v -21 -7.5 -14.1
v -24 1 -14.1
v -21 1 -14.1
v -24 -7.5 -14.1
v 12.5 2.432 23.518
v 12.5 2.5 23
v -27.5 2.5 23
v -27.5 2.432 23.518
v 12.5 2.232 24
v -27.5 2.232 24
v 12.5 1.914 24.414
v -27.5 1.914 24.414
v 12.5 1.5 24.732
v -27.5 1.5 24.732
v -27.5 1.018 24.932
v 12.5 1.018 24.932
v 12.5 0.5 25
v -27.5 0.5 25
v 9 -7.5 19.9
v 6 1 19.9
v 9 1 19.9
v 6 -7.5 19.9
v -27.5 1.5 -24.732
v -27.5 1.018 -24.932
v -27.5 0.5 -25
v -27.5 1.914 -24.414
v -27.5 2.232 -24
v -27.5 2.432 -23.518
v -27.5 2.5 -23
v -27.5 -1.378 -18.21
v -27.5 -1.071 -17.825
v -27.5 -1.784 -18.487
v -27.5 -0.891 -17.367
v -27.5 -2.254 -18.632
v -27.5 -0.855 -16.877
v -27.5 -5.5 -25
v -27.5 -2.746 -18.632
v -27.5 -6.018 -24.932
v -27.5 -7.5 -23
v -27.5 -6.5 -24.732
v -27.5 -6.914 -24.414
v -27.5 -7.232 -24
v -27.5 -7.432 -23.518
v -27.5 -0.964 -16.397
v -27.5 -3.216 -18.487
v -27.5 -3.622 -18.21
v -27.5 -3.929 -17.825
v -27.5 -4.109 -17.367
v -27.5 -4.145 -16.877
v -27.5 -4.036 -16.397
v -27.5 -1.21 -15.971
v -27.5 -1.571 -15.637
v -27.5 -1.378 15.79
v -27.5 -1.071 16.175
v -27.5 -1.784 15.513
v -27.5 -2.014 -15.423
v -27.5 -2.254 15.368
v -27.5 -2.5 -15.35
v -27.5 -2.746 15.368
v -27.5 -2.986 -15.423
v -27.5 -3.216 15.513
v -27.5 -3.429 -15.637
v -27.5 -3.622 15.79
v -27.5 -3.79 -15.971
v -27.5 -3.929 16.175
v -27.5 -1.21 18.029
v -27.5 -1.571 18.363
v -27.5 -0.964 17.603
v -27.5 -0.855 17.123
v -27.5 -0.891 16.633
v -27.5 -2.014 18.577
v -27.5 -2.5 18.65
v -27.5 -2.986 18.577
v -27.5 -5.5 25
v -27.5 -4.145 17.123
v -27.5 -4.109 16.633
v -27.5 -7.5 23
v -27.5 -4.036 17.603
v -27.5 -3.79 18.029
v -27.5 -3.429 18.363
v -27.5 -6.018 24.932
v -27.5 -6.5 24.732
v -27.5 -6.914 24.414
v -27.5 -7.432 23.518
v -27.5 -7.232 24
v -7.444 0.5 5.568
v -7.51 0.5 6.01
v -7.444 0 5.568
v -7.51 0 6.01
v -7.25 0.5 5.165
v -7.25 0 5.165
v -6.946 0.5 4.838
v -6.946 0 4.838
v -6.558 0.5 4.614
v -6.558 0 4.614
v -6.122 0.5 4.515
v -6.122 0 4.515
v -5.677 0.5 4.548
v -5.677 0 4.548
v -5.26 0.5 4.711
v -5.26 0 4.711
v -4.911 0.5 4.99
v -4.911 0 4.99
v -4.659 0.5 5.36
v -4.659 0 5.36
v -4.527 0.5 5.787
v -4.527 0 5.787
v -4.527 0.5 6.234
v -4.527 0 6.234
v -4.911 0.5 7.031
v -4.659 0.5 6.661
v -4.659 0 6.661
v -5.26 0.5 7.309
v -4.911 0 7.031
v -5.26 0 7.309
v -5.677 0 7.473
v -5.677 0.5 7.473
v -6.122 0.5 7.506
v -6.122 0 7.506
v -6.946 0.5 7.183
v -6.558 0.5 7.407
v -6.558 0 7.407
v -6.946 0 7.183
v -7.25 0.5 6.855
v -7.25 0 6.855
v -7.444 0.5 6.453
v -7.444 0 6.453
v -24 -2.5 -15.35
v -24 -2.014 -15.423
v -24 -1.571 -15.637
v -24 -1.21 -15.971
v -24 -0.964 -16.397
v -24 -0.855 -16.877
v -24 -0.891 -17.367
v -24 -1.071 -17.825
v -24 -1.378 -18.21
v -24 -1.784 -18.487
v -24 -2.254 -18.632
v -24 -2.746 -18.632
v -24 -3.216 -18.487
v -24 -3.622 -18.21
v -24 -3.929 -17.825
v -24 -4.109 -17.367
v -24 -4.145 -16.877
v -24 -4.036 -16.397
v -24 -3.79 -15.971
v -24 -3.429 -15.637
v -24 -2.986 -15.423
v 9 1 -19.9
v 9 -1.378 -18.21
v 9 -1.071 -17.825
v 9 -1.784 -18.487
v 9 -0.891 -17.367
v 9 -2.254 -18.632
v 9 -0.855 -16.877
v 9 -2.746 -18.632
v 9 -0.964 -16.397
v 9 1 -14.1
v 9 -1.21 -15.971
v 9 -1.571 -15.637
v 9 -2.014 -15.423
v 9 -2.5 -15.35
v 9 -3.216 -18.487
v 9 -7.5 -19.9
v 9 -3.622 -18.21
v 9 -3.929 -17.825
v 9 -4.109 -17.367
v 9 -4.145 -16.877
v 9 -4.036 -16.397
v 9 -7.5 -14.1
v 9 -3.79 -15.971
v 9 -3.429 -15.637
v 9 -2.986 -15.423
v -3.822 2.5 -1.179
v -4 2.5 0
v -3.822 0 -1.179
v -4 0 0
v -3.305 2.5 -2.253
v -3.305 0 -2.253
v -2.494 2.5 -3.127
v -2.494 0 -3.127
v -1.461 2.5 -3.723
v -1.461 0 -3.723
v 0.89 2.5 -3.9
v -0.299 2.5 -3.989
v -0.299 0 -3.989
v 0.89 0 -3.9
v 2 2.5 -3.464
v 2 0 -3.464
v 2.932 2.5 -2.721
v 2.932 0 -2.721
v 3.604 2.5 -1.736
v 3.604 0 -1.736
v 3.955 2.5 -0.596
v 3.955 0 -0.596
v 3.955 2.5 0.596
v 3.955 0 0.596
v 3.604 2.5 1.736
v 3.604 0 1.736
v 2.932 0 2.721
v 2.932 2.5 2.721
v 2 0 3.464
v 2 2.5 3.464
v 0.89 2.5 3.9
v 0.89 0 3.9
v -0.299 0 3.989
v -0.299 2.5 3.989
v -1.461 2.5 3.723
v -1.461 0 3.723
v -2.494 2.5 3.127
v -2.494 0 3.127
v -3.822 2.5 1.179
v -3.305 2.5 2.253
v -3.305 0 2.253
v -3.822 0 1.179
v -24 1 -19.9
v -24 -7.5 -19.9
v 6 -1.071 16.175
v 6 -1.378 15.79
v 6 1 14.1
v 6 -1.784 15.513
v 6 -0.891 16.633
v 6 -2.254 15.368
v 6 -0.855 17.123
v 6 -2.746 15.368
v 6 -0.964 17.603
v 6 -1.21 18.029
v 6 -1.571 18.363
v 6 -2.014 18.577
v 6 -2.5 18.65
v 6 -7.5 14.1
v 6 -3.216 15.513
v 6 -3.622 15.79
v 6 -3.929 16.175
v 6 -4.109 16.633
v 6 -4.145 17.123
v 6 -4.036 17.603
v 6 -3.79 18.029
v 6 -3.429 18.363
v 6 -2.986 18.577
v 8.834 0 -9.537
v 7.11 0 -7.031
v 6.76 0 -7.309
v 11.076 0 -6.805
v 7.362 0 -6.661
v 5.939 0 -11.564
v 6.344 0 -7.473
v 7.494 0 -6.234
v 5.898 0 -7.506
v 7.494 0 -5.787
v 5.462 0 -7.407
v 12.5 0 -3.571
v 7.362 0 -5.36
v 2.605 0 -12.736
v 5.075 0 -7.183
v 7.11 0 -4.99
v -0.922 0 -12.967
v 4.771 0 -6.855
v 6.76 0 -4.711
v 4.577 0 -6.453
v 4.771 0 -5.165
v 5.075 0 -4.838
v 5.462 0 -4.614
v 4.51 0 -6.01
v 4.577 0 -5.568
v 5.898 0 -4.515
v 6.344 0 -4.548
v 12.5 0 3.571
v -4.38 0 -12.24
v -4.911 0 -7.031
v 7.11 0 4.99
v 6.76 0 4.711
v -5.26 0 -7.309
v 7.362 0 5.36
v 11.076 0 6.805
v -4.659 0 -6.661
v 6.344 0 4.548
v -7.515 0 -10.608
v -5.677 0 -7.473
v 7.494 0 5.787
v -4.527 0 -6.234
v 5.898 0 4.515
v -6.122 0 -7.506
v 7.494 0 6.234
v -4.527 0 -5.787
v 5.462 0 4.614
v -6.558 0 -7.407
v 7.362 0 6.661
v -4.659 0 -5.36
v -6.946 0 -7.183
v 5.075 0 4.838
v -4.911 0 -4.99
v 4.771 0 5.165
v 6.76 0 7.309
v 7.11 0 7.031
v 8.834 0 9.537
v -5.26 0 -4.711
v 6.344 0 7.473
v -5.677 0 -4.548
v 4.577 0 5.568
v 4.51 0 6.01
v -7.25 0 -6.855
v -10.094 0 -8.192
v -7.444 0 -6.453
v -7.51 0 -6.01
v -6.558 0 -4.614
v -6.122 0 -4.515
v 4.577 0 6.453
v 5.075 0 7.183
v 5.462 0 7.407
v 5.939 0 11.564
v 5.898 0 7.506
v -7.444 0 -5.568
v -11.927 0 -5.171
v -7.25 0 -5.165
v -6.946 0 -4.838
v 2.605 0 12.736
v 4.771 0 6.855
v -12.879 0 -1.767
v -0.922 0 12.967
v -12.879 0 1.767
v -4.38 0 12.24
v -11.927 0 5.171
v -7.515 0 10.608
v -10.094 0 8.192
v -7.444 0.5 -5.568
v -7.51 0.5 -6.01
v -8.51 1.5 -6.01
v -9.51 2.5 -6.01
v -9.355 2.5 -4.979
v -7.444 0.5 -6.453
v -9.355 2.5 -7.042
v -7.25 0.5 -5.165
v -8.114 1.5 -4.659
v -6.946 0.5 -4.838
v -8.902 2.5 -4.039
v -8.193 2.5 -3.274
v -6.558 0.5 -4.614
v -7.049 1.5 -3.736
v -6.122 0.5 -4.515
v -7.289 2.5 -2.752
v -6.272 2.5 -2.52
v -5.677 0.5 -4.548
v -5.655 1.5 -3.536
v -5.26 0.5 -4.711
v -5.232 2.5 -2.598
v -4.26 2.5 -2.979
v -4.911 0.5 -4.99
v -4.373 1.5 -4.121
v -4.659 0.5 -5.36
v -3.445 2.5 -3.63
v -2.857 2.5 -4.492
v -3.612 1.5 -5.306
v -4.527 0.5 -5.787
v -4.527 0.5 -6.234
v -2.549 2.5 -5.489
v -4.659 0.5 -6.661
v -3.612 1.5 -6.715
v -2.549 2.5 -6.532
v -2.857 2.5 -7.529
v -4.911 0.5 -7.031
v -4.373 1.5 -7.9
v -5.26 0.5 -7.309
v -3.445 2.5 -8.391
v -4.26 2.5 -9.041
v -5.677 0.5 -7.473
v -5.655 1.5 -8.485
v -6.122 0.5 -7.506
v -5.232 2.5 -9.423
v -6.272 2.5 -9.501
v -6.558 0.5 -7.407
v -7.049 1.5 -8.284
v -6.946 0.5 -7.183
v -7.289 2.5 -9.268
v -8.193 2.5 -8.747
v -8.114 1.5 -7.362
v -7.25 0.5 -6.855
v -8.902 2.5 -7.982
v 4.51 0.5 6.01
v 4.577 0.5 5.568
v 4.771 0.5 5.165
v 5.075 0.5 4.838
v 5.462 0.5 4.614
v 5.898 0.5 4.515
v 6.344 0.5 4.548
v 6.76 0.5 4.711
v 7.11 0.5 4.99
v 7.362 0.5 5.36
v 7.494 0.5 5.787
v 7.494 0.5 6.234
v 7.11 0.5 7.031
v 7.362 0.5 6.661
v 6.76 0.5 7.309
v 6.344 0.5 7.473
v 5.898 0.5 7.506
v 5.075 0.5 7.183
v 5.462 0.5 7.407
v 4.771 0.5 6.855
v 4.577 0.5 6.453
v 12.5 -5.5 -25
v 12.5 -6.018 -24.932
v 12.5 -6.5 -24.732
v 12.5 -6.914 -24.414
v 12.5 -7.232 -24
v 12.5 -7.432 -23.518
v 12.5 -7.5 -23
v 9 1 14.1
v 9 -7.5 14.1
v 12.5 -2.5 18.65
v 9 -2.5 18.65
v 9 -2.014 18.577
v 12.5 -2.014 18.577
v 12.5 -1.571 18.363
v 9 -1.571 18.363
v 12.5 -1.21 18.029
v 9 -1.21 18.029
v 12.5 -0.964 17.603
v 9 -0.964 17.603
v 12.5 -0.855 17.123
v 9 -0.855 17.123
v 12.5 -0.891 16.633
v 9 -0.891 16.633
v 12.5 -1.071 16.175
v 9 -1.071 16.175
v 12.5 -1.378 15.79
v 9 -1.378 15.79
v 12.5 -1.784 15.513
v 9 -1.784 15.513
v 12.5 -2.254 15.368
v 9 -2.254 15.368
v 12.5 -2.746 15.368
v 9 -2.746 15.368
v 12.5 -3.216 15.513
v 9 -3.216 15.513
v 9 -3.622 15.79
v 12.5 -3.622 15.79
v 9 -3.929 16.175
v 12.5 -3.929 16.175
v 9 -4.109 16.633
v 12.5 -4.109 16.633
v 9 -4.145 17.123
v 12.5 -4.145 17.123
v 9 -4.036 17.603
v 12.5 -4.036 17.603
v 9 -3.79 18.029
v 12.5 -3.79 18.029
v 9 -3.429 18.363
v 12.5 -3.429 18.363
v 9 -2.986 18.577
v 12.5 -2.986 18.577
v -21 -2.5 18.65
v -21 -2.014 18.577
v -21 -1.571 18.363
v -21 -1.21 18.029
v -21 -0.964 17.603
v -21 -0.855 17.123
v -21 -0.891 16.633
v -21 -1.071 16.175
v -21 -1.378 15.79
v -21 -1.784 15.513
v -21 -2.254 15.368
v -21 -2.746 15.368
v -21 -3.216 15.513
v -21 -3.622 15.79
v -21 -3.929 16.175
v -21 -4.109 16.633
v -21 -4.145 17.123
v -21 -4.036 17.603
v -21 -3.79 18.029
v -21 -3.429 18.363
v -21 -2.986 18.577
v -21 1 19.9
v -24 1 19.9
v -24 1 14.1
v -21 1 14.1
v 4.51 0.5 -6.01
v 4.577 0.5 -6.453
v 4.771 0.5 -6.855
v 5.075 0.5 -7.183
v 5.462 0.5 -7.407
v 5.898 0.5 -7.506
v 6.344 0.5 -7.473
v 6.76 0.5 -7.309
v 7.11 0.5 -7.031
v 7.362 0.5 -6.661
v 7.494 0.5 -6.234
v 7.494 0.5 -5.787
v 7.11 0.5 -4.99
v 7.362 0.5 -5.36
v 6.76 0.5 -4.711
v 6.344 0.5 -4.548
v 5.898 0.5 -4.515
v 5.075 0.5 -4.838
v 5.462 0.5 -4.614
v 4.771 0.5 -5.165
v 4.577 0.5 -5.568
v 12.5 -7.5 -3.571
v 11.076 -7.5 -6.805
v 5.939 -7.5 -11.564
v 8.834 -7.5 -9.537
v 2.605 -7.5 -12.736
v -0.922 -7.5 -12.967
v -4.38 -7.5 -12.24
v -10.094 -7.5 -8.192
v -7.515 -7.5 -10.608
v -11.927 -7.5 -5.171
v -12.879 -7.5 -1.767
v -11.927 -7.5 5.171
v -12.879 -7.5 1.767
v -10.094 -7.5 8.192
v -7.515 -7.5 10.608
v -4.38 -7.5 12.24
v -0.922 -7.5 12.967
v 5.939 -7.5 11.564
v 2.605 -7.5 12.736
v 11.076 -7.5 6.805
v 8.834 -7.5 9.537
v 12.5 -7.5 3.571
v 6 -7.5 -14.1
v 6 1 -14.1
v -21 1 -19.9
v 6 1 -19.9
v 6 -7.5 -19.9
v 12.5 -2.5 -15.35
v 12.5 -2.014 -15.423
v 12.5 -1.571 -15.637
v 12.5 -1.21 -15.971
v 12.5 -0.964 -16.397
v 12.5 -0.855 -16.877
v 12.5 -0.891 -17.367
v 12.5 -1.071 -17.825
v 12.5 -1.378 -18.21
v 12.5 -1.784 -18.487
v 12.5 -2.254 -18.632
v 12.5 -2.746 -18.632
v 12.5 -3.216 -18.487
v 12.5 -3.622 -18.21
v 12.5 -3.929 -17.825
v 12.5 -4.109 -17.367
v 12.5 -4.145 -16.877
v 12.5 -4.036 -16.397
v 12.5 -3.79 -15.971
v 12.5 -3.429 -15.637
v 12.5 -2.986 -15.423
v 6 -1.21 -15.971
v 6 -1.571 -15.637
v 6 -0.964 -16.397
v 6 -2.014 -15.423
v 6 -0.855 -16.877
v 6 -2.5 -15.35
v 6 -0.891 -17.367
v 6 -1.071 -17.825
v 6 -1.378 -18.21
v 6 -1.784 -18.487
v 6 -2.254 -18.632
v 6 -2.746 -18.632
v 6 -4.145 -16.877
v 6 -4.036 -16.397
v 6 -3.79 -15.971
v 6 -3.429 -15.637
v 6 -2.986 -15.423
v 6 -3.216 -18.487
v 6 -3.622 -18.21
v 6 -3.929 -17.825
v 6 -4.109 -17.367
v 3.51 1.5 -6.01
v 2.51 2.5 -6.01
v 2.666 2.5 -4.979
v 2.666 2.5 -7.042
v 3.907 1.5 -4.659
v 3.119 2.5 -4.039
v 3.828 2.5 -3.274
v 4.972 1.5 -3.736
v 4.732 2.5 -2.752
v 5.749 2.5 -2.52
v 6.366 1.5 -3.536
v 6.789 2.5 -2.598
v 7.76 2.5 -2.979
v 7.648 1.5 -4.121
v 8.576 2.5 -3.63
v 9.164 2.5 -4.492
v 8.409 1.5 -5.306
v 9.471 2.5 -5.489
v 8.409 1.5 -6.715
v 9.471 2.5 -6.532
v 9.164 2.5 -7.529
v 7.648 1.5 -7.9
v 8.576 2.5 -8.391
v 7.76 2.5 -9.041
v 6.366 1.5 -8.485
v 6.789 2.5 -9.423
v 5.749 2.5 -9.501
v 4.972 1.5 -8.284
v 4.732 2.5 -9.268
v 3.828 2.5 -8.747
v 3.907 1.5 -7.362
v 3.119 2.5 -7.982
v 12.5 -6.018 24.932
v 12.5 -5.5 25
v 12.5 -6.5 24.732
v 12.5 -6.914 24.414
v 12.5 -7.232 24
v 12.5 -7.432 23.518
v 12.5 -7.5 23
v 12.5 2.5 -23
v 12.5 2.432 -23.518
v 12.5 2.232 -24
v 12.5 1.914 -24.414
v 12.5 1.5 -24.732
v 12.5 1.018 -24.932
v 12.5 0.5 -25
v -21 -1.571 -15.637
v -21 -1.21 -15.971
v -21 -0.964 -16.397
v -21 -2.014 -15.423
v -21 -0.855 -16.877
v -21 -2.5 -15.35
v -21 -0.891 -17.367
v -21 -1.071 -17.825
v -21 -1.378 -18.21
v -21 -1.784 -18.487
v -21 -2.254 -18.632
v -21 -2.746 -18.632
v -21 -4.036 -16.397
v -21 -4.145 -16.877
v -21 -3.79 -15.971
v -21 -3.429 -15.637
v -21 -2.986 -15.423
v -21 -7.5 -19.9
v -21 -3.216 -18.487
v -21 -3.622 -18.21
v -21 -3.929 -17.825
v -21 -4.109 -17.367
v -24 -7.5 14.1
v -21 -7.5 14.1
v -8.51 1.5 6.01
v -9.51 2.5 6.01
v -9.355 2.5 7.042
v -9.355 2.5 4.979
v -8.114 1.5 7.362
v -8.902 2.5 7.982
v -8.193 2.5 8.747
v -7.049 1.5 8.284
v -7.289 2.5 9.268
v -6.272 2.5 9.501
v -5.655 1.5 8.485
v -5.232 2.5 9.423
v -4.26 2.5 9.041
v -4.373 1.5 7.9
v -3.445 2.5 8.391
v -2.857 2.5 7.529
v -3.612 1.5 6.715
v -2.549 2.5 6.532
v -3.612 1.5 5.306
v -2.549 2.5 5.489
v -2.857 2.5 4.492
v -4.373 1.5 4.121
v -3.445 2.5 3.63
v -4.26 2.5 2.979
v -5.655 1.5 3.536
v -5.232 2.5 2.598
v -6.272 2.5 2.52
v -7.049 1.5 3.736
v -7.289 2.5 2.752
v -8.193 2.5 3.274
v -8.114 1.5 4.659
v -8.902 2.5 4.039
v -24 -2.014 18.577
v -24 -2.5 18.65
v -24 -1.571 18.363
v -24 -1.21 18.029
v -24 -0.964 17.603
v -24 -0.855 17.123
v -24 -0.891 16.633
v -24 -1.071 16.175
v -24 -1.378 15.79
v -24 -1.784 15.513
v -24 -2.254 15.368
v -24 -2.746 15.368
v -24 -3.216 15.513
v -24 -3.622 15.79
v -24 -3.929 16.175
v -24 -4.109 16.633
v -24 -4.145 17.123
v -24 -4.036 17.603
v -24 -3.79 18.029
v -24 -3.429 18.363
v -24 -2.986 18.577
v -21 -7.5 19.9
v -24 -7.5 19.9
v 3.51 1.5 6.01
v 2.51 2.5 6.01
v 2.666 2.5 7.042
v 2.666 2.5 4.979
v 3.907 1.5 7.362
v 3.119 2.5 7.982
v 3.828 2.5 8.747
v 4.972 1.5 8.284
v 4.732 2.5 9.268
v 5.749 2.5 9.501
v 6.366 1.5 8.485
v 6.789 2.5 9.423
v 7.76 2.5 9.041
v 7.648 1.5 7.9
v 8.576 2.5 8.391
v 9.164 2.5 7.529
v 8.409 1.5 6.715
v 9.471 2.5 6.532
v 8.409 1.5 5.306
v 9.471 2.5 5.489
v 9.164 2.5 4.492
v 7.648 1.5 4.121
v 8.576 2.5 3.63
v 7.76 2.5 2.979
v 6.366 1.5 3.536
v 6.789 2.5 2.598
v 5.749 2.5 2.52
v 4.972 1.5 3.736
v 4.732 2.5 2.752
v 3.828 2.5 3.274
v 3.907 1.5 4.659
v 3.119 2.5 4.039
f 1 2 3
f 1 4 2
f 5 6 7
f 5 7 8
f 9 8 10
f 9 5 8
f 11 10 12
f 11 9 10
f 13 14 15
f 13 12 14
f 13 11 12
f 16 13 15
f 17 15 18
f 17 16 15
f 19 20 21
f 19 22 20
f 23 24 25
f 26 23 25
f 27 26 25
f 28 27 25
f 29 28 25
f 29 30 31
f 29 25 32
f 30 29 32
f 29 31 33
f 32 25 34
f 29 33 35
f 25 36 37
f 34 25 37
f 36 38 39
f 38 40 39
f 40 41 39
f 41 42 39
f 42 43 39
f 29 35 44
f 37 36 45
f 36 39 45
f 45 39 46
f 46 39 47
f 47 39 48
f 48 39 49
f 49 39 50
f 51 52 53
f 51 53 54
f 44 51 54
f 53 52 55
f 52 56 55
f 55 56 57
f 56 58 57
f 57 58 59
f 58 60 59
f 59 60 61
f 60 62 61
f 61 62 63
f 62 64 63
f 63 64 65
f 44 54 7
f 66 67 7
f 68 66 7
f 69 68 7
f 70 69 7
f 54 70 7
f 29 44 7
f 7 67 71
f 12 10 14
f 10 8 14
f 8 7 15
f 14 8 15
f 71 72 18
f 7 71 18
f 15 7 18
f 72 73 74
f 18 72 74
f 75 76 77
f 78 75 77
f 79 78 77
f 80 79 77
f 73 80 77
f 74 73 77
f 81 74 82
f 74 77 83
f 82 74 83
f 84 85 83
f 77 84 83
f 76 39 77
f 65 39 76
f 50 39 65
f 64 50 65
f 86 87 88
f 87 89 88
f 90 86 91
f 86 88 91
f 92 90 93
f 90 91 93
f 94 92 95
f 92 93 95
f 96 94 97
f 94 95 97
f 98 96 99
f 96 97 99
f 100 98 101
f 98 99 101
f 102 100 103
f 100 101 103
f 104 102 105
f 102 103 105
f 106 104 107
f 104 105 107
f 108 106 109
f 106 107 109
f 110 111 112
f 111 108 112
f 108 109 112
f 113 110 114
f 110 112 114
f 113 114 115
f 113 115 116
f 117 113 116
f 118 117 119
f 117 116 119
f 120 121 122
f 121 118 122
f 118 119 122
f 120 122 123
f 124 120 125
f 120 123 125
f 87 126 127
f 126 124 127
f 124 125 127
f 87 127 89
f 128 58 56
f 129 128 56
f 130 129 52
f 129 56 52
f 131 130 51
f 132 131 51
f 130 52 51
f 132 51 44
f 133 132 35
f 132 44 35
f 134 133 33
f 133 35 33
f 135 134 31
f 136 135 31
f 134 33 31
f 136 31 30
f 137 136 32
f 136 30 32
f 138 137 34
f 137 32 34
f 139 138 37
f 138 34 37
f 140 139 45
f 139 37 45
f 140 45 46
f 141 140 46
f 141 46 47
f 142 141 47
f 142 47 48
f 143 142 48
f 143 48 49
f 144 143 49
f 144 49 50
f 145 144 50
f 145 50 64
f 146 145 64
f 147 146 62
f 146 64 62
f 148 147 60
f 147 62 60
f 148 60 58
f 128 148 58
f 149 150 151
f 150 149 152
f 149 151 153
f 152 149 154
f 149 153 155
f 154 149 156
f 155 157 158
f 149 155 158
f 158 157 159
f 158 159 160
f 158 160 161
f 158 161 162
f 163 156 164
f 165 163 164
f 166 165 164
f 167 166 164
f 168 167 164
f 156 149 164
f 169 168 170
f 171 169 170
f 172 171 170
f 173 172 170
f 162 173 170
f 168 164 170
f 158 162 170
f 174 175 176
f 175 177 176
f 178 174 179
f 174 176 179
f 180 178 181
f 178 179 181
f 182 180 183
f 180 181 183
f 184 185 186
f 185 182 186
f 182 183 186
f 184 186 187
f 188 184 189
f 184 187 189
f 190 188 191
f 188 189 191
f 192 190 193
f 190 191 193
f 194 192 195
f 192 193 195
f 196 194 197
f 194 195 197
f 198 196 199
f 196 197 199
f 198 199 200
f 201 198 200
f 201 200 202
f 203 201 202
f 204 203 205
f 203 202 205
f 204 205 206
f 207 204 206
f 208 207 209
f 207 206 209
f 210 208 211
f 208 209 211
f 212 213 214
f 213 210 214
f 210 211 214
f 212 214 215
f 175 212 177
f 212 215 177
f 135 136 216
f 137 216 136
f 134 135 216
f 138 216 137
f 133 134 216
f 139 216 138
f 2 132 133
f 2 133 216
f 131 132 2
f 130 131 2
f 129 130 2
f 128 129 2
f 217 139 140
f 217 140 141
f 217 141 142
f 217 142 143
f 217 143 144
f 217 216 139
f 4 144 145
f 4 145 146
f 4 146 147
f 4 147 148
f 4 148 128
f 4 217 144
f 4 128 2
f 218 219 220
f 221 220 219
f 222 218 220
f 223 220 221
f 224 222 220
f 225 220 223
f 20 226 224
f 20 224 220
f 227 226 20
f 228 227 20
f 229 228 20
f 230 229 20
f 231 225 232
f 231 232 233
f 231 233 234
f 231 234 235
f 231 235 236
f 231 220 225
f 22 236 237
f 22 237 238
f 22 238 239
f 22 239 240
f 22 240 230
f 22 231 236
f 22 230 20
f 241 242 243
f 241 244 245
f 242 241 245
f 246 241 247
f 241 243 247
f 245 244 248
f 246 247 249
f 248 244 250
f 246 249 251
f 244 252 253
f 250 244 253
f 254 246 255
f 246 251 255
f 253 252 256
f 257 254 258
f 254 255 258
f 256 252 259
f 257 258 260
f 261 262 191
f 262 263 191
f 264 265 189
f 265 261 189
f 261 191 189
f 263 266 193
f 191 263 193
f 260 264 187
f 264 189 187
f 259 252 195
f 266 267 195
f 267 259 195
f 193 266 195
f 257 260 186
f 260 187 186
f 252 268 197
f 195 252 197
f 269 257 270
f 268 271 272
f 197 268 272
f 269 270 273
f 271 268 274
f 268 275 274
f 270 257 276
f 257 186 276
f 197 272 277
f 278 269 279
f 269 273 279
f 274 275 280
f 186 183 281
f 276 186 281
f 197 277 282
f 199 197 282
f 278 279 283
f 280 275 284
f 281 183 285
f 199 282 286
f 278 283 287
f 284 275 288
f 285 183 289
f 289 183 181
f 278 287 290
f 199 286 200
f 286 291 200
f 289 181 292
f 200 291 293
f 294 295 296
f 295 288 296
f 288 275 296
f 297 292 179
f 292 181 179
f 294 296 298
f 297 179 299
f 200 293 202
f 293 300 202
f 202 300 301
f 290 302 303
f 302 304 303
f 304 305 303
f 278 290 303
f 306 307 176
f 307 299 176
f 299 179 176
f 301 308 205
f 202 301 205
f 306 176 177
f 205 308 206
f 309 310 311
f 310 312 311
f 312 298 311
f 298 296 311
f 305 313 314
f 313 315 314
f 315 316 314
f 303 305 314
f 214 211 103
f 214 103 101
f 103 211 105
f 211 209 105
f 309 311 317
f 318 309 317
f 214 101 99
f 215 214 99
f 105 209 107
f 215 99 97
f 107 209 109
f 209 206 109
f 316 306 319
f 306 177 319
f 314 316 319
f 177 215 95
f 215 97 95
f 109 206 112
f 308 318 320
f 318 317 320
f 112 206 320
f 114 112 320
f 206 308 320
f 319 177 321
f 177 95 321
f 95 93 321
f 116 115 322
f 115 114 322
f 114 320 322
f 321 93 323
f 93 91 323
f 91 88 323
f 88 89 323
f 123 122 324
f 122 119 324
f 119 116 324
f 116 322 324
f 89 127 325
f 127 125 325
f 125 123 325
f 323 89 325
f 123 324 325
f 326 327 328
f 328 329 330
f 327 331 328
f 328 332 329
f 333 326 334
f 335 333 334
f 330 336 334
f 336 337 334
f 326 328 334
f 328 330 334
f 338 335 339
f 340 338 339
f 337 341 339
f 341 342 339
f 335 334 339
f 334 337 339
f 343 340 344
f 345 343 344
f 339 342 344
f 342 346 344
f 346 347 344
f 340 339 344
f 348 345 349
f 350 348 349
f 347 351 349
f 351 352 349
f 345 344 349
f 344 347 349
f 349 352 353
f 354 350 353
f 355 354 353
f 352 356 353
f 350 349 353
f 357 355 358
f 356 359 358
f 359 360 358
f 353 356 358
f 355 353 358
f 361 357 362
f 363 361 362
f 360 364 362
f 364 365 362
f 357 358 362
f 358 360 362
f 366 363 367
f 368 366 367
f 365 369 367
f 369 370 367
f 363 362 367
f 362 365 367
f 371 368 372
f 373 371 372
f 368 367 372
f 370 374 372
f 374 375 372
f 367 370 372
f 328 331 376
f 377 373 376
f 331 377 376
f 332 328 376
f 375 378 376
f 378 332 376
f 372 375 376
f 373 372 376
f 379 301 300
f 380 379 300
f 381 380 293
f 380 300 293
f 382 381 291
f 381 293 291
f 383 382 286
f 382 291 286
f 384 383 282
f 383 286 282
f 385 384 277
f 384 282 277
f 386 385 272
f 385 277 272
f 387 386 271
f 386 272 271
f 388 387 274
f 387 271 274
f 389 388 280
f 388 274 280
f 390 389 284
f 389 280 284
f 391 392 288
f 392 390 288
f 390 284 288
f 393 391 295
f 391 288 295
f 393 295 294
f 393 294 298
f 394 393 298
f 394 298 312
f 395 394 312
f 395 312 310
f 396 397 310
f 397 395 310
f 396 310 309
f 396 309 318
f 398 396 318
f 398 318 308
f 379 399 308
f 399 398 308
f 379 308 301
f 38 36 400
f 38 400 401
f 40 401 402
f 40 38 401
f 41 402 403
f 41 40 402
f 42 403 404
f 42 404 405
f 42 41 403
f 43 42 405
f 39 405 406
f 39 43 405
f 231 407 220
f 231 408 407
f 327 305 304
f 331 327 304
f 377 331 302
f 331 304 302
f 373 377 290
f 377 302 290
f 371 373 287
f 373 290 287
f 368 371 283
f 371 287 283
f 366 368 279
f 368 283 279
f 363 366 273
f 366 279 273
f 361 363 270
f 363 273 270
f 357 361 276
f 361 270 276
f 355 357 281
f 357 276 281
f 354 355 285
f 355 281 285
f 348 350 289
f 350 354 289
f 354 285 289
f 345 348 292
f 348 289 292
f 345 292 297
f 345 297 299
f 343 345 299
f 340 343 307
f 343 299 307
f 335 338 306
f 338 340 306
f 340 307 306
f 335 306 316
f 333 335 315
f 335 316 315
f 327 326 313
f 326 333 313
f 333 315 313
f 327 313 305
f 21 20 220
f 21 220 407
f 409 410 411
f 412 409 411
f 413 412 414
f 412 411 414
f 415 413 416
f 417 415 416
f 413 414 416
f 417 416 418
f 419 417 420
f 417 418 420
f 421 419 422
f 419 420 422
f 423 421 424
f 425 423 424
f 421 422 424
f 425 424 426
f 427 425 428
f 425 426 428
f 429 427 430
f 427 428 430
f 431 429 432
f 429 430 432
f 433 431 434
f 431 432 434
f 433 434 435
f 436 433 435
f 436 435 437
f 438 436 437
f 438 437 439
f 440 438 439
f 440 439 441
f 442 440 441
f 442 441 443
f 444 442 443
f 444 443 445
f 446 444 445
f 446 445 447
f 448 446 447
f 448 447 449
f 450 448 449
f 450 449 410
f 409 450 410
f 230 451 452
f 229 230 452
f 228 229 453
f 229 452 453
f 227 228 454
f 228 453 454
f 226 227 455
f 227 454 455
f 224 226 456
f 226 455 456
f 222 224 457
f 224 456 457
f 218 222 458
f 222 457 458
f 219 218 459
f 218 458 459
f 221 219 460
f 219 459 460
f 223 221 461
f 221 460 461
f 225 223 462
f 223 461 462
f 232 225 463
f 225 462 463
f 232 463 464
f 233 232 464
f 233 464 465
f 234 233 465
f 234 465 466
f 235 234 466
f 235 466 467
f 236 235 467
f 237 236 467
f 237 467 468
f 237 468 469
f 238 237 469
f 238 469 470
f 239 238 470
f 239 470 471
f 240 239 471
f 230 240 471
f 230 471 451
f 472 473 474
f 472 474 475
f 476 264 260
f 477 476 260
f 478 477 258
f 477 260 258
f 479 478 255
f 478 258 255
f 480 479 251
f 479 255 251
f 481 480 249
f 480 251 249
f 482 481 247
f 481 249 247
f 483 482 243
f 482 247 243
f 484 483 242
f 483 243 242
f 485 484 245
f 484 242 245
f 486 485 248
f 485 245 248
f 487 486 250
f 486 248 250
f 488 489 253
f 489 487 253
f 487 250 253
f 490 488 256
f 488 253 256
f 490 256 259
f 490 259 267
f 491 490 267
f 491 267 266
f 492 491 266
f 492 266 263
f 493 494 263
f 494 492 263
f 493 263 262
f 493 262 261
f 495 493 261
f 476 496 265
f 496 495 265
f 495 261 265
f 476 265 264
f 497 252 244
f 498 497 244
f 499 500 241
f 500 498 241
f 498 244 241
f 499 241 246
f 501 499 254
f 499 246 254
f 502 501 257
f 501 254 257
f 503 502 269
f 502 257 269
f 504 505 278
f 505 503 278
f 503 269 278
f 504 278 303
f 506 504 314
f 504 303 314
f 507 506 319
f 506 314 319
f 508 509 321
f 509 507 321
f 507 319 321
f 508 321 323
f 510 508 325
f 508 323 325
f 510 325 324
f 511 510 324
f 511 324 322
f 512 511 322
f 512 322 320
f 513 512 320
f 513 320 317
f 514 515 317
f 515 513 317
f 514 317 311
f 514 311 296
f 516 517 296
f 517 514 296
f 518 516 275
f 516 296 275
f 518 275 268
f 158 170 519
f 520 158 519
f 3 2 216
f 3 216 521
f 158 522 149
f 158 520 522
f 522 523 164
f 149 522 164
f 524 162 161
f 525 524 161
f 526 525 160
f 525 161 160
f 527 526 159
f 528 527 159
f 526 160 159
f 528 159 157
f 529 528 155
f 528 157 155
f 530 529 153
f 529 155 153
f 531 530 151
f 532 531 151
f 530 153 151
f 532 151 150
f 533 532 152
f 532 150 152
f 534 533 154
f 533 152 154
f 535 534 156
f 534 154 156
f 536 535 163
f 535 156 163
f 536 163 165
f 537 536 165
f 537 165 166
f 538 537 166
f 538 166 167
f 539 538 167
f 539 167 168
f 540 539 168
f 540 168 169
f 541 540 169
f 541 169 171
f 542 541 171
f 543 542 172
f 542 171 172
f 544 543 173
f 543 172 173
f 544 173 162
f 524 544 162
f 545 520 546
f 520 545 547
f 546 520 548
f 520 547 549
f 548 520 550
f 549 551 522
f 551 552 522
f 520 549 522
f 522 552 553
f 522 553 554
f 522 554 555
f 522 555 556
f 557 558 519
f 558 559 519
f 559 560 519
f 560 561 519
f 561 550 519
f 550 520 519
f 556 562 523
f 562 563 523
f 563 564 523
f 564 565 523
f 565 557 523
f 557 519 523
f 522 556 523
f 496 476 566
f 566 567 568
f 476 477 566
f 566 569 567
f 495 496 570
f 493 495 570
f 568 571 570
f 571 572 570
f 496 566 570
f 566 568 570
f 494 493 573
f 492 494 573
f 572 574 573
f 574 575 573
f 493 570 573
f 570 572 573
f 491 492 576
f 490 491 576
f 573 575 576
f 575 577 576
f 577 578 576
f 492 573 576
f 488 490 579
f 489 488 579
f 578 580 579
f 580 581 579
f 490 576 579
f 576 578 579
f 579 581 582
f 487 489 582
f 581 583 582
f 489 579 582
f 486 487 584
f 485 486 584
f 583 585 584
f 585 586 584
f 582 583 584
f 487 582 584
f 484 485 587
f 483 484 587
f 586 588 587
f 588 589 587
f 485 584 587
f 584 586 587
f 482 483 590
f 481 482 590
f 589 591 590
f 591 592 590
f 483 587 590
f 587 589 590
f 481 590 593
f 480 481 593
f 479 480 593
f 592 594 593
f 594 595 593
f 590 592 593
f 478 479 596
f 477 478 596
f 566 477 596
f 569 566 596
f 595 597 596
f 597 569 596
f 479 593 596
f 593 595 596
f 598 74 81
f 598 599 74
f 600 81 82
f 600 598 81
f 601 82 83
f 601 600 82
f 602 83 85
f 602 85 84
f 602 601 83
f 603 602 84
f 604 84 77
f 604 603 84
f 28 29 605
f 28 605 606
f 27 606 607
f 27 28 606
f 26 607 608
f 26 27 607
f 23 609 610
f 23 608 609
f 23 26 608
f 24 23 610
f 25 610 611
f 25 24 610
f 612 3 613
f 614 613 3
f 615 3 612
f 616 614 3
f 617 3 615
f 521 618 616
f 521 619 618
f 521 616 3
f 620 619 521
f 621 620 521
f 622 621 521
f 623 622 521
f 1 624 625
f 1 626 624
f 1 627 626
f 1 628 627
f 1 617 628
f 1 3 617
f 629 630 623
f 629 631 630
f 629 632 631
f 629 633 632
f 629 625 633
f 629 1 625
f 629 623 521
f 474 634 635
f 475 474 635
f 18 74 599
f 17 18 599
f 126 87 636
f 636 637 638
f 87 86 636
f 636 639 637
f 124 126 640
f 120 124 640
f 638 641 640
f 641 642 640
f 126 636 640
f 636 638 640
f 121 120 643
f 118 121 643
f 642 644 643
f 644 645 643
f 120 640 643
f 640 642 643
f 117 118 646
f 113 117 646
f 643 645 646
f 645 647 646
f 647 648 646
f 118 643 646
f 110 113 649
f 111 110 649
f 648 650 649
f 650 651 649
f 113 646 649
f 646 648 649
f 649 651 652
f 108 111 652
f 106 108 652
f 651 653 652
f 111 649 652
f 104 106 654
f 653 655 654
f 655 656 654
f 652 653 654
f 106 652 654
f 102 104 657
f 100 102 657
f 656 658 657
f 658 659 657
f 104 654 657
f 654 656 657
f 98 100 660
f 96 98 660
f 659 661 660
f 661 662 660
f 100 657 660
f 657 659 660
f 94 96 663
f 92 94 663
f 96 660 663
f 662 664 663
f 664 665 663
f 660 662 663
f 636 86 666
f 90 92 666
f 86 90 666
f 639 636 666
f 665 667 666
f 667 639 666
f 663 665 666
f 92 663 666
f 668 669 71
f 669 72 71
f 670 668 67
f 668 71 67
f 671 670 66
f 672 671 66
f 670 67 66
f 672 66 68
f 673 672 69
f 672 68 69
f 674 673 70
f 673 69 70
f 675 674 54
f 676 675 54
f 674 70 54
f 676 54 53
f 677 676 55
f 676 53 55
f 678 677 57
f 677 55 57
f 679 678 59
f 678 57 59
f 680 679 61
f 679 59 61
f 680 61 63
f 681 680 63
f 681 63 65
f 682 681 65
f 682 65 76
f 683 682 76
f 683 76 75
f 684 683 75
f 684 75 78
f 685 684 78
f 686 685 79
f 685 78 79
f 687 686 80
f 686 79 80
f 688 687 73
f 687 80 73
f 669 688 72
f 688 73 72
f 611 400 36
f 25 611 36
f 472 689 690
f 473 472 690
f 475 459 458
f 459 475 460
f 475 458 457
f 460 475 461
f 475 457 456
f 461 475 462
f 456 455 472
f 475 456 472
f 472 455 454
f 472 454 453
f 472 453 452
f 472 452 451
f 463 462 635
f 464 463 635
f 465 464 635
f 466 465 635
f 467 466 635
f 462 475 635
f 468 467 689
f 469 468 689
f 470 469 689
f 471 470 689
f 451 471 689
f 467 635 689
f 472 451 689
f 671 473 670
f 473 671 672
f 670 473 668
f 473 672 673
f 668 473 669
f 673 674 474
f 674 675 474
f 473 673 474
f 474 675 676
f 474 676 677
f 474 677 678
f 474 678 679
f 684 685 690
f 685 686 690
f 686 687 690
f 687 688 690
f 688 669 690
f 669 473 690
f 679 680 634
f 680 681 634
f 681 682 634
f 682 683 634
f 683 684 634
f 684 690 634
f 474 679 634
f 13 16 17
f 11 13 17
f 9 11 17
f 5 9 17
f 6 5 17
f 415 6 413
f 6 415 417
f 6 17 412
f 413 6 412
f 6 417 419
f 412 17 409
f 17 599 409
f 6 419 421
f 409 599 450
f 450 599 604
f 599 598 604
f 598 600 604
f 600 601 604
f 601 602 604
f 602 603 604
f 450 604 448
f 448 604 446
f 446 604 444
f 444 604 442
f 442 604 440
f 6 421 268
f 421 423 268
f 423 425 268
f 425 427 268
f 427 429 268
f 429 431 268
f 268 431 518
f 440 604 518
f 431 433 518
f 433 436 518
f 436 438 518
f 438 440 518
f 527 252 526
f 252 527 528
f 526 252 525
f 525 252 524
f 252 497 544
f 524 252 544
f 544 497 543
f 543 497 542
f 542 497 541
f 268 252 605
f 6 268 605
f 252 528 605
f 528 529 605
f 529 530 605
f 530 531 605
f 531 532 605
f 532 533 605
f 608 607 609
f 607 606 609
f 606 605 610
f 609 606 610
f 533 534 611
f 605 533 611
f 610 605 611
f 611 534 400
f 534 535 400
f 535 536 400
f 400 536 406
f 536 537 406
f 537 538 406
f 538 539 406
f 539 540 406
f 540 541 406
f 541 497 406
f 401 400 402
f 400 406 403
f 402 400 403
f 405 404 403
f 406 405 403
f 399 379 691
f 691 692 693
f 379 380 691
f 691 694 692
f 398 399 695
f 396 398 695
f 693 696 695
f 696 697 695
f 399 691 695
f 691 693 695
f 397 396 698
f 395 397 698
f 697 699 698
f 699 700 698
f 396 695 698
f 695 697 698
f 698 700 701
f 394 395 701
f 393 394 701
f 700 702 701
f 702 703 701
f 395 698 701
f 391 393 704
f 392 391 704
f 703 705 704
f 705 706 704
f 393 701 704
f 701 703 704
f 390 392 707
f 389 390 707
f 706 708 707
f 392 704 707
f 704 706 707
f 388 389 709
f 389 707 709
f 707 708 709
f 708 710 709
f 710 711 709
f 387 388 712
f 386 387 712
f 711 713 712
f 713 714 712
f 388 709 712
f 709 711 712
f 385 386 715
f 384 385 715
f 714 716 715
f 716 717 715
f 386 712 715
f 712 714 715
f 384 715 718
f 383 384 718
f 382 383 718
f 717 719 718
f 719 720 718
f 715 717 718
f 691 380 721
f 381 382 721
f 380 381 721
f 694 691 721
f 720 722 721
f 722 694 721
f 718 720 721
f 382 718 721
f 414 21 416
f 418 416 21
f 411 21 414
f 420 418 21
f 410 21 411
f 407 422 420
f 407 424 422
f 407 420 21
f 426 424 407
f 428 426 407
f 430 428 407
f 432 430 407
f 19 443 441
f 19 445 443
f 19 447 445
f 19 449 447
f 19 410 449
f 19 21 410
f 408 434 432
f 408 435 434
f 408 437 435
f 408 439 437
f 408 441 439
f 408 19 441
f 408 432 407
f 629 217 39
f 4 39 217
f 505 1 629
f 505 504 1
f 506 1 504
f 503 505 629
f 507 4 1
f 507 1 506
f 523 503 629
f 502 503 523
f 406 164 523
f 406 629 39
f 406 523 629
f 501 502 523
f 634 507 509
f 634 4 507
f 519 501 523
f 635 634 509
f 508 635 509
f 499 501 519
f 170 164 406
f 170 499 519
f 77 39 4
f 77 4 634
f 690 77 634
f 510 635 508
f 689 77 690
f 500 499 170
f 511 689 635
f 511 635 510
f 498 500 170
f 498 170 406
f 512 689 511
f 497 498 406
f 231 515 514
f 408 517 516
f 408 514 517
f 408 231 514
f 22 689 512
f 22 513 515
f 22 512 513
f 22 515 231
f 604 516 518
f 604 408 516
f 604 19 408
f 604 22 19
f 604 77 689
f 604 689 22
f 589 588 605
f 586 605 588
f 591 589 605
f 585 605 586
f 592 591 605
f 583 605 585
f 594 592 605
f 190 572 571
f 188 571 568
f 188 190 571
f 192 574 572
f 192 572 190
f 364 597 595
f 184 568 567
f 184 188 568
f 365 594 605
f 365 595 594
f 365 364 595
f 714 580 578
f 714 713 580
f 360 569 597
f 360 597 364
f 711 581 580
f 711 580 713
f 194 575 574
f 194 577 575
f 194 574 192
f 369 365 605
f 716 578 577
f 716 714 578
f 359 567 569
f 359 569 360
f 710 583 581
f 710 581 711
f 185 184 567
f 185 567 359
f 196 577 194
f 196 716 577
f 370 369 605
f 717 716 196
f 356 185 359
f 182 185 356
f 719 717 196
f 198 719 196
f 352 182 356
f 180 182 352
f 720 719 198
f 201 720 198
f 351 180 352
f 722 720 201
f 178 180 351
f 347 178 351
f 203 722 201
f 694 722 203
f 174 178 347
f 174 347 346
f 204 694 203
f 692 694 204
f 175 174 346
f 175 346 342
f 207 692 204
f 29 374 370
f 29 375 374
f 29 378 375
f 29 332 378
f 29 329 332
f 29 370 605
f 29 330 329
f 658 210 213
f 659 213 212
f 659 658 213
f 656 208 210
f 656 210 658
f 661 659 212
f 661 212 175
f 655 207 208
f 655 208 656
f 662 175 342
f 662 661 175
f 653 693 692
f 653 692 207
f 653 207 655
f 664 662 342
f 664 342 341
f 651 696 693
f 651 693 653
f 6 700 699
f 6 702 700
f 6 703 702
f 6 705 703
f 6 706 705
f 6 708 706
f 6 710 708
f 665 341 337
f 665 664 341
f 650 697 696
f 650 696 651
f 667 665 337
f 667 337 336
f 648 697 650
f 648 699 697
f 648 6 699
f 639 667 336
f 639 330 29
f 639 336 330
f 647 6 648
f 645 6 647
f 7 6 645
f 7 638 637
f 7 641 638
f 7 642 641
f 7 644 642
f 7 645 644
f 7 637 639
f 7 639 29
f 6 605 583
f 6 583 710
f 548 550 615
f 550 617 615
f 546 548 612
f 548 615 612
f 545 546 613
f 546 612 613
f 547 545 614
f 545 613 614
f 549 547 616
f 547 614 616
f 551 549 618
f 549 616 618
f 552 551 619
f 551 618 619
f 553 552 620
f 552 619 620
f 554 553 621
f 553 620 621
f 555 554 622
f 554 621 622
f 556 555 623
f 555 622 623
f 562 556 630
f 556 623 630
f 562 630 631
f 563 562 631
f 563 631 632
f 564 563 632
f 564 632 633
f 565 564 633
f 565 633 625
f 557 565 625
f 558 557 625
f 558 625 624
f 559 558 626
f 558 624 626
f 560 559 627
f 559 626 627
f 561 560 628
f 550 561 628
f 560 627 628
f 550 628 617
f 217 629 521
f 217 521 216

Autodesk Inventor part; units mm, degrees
ref_plane "YZ Plane" through (0, 0, 0) normal (1, 0, 0) x (0, 1, 0)
ref_plane "XZ Plane" through (0, 0, 0) normal (0, 1, 0) x (-1, 0, 0)
ref_plane "XY Plane" through (0, 0, 0) normal (0, 0, 1) x (1, 0, 0)
sketch "Эскиз1" plane through (0, 0, 0) normal (0, 1, 0) x (-1, 0, 0)
  circle A0 centre (0, 0) radius 12.5 construction
  circle A1 centre (0, 0) radius 8.5 construction
  circle A2 centre (6.0104, 6.0104) radius 1.5
  circle A3 centre (-6.0104, -6.0104) radius 1.5
  circle A4 centre (0, 0) radius 4
  line L0 (27.5, 25) -> (-12.5, 25)
  line L1 (-12.5, 25) -> (-12.5, -25)
  line L2 (-12.5, -25) -> (27.5, -25)
  line L3 (27.5, -25) -> (27.5, 25)
  line L4 (8.8388, -8.8388) -> (-8.8388, 8.8388) construction
  line L5 (-8.8388, -8.8388) -> (8.8388, 8.8388) construction
  circle A5 centre (6.0104, -6.0104) radius 1.5
  circle A6 centre (-6.0104, 6.0104) radius 1.5
  point P0 (7.5, 25)
  point P1 (7.5, -25)
  dimension "d0" = 25
  dimension "d1" = 17
  dimension "d2" = 3
  dimension "d3" = 3
  dimension "d4" = 8
  dimension "d5" = 40
  dimension "d6" = 50
  dimension "d7" = 25
  dimension "d26" = 25
  dimension "d31" = 45
  dimension "d32" = 90
  dimension "d33" = 3
  dimension "d34" = 3
extrude "Выдавливание1" add sketch "Эскиз1" along normal blind 2.5
sketch "Эскиз2" plane through (0, 0, 0) normal (0, -1, 0) x (1, 0, 0)
  circle A0 centre (0, 0) radius 13
  line L0 (12.5, 25) -> (12.5, -25) projected
  line L1 (-27.5, 25) -> (12.5, 25) projected
  line L2 (-27.5, -25) -> (-27.5, 25) projected
  line L3 (12.5, -25) -> (-27.5, -25) projected
  circle A1 centre (-6.0104, 6.0104) radius 1.5 projected
  circle A2 centre (6.0104, -6.0104) radius 1.5 projected
  circle A3 centre (0, 0) radius 4 projected
  point P0 (12.5, -3.5707)
  point P1 (12.5, 3.5707)
  dimension "d10" = 26
extrude "Выдавливание2" add sketch "Эскиз2" along normal blind 7.5 contours A0 L0 L3 L2 L1
fillet "Сопряжение1" radius 2 4 edges at (-7.5, -7.5, -25) (-7.5, 2.5, -25) (-7.5, -7.5, 25) (-7.5, 2.5, 25)
sketch "Эскиз4" plane through (-27.5, -5.5, -25) normal (-1, 0, 0) x (0, 0, 1)
  arc A0 (50, 6) -> (48, 8) centre (48, 6) ccw projected
  line L0 (2, 8) -> (48, 8) projected
  arc A1 (2, 8) -> (0, 6) centre (2, 6) ccw projected
  line L1 (0, 0) -> (0, 6) projected
  arc A2 (0, 0) -> (2, -2) centre (2, 0) ccw projected
  line L2 (48, -2) -> (2, -2) projected
  arc A3 (48, -2) -> (50, 0) centre (48, 0) ccw projected
  line L3 (50, 0) -> (50, 6) projected
  circle A4 centre (42, 3) radius 1.65
  circle A5 centre (8, 3) radius 1.65
  point P0 (25, 5.5)
  point P1 (50, 3)
  dimension "d21" = 3.3
  dimension "d22" = 3.3
  dimension "d41" = 5
  dimension "d42" = 34
  dimension "d43" = 8
  dimension "d44" = 5
extrude "Выдавливание4" cut sketch "Эскиз4" against normal through all contours A4 | A5
chamfer "Фаска1" distance 2 angle 45 4 edges at (-4.5104, 2.5, 6.0104) (7.5104, 2.5, -6.0104) (-4.5104, 2.5, -6.0104) (7.5104, 2.5, 6.0104)
sketch "Эскиз5" plane through (0, -7.5, 0) normal (0, -1, 0) x (1, 0, 0)
  line L0 (-27.5, 23) -> (12.5, 23) projected
  line L1 (-27.5, 23) -> (-27.5, -23) projected
  line L2 (12.5, -23) -> (-27.5, -23) projected
  line L3 (12.5, -23) -> (12.5, -3.5707) projected
  arc A0 (12.5, 3.5707) -> (12.5, -3.5707) centre (0, 0) ccw projected
  line L4 (12.5, 3.5707) -> (12.5, 23) projected
  line L5 (-27.5, -18.65) -> (12.5, -18.65) projected
  line L6 (-27.5, -15.35) -> (12.5, -15.35) projected
  line L7 (12.5, -18.65) -> (12.5, -15.35)
  line L8 (12.5, -17) -> (-27.5, -17) construction
  line L9 (9, -14.1) -> (6, -14.1)
  line L10 (6, -14.1) -> (6, -19.9)
  line L11 (6, -19.9) -> (9, -19.9)
  line L12 (9, -19.9) -> (9, -14.1)
  line L13 (9, -14.1) -> (6, -19.9) construction
  line L14 (6, -14.1) -> (9, -19.9) construction
  circle A1 centre (0, 0) radius 4 projected
  line L15 (0, 0) -> (12.5, 0) construction
  line L16 (12.5, 3.5707) -> (12.5, -3.5707) projected
  line L17 (-7.5, -23) -> (-7.5, 23) construction
  line L18 (9, 14.1) -> (6, 14.1)
  line L19 (6, 14.1) -> (6, 19.9)
  line L20 (6, 19.9) -> (9, 19.9)
  line L21 (9, 19.9) -> (9, 14.1)
  line L22 (9, 14.1) -> (6, 19.9) construction
  line L23 (6, 14.1) -> (9, 19.9) construction
  line L24 (-24, -14.1) -> (-21, -14.1)
  line L25 (-21, -14.1) -> (-21, -19.9)
  line L26 (-21, -19.9) -> (-24, -19.9)
  line L27 (-24, -19.9) -> (-24, -14.1)
  line L28 (-24, -14.1) -> (-21, -19.9) construction
  line L29 (-21, -14.1) -> (-24, -19.9) construction
  line L30 (-21, 14.1) -> (-21, 19.9)
  line L31 (-21, 19.9) -> (-24, 19.9)
  line L32 (-24, 14.1) -> (-21, 14.1)
  line L33 (-24, 19.9) -> (-24, 14.1)
  line L34 (-24, 14.1) -> (-21, 19.9) construction
  line L35 (-21, 14.1) -> (-24, 19.9) construction
  point P0 (7.5, -17)
  point P1 (12.5, -13.2854)
  point P2 (7.5, 17)
  point P3 (-22.5, -17)
  point P4 (-22.5, 17)
  dimension "d35" = 3
  dimension "d36" = 5.8
  dimension "d38" = 5
extrude "Выдавливание5" cut sketch "Эскиз5" against normal blind 8.5 contours L27 L24 L25 L6 | L6 L25 L5 L27 | L5 L25 L26 L27 | L10 L9 L12 L6 | L6 L12 L5 L10 | L5 L12 L11 L10 | L18 L19 L20 L21 | L32 L33 L31 L30
equation "\"d7\" = 0.5 * d6"
equation "\"d22\" = d21"
properties part number "motoramma"
